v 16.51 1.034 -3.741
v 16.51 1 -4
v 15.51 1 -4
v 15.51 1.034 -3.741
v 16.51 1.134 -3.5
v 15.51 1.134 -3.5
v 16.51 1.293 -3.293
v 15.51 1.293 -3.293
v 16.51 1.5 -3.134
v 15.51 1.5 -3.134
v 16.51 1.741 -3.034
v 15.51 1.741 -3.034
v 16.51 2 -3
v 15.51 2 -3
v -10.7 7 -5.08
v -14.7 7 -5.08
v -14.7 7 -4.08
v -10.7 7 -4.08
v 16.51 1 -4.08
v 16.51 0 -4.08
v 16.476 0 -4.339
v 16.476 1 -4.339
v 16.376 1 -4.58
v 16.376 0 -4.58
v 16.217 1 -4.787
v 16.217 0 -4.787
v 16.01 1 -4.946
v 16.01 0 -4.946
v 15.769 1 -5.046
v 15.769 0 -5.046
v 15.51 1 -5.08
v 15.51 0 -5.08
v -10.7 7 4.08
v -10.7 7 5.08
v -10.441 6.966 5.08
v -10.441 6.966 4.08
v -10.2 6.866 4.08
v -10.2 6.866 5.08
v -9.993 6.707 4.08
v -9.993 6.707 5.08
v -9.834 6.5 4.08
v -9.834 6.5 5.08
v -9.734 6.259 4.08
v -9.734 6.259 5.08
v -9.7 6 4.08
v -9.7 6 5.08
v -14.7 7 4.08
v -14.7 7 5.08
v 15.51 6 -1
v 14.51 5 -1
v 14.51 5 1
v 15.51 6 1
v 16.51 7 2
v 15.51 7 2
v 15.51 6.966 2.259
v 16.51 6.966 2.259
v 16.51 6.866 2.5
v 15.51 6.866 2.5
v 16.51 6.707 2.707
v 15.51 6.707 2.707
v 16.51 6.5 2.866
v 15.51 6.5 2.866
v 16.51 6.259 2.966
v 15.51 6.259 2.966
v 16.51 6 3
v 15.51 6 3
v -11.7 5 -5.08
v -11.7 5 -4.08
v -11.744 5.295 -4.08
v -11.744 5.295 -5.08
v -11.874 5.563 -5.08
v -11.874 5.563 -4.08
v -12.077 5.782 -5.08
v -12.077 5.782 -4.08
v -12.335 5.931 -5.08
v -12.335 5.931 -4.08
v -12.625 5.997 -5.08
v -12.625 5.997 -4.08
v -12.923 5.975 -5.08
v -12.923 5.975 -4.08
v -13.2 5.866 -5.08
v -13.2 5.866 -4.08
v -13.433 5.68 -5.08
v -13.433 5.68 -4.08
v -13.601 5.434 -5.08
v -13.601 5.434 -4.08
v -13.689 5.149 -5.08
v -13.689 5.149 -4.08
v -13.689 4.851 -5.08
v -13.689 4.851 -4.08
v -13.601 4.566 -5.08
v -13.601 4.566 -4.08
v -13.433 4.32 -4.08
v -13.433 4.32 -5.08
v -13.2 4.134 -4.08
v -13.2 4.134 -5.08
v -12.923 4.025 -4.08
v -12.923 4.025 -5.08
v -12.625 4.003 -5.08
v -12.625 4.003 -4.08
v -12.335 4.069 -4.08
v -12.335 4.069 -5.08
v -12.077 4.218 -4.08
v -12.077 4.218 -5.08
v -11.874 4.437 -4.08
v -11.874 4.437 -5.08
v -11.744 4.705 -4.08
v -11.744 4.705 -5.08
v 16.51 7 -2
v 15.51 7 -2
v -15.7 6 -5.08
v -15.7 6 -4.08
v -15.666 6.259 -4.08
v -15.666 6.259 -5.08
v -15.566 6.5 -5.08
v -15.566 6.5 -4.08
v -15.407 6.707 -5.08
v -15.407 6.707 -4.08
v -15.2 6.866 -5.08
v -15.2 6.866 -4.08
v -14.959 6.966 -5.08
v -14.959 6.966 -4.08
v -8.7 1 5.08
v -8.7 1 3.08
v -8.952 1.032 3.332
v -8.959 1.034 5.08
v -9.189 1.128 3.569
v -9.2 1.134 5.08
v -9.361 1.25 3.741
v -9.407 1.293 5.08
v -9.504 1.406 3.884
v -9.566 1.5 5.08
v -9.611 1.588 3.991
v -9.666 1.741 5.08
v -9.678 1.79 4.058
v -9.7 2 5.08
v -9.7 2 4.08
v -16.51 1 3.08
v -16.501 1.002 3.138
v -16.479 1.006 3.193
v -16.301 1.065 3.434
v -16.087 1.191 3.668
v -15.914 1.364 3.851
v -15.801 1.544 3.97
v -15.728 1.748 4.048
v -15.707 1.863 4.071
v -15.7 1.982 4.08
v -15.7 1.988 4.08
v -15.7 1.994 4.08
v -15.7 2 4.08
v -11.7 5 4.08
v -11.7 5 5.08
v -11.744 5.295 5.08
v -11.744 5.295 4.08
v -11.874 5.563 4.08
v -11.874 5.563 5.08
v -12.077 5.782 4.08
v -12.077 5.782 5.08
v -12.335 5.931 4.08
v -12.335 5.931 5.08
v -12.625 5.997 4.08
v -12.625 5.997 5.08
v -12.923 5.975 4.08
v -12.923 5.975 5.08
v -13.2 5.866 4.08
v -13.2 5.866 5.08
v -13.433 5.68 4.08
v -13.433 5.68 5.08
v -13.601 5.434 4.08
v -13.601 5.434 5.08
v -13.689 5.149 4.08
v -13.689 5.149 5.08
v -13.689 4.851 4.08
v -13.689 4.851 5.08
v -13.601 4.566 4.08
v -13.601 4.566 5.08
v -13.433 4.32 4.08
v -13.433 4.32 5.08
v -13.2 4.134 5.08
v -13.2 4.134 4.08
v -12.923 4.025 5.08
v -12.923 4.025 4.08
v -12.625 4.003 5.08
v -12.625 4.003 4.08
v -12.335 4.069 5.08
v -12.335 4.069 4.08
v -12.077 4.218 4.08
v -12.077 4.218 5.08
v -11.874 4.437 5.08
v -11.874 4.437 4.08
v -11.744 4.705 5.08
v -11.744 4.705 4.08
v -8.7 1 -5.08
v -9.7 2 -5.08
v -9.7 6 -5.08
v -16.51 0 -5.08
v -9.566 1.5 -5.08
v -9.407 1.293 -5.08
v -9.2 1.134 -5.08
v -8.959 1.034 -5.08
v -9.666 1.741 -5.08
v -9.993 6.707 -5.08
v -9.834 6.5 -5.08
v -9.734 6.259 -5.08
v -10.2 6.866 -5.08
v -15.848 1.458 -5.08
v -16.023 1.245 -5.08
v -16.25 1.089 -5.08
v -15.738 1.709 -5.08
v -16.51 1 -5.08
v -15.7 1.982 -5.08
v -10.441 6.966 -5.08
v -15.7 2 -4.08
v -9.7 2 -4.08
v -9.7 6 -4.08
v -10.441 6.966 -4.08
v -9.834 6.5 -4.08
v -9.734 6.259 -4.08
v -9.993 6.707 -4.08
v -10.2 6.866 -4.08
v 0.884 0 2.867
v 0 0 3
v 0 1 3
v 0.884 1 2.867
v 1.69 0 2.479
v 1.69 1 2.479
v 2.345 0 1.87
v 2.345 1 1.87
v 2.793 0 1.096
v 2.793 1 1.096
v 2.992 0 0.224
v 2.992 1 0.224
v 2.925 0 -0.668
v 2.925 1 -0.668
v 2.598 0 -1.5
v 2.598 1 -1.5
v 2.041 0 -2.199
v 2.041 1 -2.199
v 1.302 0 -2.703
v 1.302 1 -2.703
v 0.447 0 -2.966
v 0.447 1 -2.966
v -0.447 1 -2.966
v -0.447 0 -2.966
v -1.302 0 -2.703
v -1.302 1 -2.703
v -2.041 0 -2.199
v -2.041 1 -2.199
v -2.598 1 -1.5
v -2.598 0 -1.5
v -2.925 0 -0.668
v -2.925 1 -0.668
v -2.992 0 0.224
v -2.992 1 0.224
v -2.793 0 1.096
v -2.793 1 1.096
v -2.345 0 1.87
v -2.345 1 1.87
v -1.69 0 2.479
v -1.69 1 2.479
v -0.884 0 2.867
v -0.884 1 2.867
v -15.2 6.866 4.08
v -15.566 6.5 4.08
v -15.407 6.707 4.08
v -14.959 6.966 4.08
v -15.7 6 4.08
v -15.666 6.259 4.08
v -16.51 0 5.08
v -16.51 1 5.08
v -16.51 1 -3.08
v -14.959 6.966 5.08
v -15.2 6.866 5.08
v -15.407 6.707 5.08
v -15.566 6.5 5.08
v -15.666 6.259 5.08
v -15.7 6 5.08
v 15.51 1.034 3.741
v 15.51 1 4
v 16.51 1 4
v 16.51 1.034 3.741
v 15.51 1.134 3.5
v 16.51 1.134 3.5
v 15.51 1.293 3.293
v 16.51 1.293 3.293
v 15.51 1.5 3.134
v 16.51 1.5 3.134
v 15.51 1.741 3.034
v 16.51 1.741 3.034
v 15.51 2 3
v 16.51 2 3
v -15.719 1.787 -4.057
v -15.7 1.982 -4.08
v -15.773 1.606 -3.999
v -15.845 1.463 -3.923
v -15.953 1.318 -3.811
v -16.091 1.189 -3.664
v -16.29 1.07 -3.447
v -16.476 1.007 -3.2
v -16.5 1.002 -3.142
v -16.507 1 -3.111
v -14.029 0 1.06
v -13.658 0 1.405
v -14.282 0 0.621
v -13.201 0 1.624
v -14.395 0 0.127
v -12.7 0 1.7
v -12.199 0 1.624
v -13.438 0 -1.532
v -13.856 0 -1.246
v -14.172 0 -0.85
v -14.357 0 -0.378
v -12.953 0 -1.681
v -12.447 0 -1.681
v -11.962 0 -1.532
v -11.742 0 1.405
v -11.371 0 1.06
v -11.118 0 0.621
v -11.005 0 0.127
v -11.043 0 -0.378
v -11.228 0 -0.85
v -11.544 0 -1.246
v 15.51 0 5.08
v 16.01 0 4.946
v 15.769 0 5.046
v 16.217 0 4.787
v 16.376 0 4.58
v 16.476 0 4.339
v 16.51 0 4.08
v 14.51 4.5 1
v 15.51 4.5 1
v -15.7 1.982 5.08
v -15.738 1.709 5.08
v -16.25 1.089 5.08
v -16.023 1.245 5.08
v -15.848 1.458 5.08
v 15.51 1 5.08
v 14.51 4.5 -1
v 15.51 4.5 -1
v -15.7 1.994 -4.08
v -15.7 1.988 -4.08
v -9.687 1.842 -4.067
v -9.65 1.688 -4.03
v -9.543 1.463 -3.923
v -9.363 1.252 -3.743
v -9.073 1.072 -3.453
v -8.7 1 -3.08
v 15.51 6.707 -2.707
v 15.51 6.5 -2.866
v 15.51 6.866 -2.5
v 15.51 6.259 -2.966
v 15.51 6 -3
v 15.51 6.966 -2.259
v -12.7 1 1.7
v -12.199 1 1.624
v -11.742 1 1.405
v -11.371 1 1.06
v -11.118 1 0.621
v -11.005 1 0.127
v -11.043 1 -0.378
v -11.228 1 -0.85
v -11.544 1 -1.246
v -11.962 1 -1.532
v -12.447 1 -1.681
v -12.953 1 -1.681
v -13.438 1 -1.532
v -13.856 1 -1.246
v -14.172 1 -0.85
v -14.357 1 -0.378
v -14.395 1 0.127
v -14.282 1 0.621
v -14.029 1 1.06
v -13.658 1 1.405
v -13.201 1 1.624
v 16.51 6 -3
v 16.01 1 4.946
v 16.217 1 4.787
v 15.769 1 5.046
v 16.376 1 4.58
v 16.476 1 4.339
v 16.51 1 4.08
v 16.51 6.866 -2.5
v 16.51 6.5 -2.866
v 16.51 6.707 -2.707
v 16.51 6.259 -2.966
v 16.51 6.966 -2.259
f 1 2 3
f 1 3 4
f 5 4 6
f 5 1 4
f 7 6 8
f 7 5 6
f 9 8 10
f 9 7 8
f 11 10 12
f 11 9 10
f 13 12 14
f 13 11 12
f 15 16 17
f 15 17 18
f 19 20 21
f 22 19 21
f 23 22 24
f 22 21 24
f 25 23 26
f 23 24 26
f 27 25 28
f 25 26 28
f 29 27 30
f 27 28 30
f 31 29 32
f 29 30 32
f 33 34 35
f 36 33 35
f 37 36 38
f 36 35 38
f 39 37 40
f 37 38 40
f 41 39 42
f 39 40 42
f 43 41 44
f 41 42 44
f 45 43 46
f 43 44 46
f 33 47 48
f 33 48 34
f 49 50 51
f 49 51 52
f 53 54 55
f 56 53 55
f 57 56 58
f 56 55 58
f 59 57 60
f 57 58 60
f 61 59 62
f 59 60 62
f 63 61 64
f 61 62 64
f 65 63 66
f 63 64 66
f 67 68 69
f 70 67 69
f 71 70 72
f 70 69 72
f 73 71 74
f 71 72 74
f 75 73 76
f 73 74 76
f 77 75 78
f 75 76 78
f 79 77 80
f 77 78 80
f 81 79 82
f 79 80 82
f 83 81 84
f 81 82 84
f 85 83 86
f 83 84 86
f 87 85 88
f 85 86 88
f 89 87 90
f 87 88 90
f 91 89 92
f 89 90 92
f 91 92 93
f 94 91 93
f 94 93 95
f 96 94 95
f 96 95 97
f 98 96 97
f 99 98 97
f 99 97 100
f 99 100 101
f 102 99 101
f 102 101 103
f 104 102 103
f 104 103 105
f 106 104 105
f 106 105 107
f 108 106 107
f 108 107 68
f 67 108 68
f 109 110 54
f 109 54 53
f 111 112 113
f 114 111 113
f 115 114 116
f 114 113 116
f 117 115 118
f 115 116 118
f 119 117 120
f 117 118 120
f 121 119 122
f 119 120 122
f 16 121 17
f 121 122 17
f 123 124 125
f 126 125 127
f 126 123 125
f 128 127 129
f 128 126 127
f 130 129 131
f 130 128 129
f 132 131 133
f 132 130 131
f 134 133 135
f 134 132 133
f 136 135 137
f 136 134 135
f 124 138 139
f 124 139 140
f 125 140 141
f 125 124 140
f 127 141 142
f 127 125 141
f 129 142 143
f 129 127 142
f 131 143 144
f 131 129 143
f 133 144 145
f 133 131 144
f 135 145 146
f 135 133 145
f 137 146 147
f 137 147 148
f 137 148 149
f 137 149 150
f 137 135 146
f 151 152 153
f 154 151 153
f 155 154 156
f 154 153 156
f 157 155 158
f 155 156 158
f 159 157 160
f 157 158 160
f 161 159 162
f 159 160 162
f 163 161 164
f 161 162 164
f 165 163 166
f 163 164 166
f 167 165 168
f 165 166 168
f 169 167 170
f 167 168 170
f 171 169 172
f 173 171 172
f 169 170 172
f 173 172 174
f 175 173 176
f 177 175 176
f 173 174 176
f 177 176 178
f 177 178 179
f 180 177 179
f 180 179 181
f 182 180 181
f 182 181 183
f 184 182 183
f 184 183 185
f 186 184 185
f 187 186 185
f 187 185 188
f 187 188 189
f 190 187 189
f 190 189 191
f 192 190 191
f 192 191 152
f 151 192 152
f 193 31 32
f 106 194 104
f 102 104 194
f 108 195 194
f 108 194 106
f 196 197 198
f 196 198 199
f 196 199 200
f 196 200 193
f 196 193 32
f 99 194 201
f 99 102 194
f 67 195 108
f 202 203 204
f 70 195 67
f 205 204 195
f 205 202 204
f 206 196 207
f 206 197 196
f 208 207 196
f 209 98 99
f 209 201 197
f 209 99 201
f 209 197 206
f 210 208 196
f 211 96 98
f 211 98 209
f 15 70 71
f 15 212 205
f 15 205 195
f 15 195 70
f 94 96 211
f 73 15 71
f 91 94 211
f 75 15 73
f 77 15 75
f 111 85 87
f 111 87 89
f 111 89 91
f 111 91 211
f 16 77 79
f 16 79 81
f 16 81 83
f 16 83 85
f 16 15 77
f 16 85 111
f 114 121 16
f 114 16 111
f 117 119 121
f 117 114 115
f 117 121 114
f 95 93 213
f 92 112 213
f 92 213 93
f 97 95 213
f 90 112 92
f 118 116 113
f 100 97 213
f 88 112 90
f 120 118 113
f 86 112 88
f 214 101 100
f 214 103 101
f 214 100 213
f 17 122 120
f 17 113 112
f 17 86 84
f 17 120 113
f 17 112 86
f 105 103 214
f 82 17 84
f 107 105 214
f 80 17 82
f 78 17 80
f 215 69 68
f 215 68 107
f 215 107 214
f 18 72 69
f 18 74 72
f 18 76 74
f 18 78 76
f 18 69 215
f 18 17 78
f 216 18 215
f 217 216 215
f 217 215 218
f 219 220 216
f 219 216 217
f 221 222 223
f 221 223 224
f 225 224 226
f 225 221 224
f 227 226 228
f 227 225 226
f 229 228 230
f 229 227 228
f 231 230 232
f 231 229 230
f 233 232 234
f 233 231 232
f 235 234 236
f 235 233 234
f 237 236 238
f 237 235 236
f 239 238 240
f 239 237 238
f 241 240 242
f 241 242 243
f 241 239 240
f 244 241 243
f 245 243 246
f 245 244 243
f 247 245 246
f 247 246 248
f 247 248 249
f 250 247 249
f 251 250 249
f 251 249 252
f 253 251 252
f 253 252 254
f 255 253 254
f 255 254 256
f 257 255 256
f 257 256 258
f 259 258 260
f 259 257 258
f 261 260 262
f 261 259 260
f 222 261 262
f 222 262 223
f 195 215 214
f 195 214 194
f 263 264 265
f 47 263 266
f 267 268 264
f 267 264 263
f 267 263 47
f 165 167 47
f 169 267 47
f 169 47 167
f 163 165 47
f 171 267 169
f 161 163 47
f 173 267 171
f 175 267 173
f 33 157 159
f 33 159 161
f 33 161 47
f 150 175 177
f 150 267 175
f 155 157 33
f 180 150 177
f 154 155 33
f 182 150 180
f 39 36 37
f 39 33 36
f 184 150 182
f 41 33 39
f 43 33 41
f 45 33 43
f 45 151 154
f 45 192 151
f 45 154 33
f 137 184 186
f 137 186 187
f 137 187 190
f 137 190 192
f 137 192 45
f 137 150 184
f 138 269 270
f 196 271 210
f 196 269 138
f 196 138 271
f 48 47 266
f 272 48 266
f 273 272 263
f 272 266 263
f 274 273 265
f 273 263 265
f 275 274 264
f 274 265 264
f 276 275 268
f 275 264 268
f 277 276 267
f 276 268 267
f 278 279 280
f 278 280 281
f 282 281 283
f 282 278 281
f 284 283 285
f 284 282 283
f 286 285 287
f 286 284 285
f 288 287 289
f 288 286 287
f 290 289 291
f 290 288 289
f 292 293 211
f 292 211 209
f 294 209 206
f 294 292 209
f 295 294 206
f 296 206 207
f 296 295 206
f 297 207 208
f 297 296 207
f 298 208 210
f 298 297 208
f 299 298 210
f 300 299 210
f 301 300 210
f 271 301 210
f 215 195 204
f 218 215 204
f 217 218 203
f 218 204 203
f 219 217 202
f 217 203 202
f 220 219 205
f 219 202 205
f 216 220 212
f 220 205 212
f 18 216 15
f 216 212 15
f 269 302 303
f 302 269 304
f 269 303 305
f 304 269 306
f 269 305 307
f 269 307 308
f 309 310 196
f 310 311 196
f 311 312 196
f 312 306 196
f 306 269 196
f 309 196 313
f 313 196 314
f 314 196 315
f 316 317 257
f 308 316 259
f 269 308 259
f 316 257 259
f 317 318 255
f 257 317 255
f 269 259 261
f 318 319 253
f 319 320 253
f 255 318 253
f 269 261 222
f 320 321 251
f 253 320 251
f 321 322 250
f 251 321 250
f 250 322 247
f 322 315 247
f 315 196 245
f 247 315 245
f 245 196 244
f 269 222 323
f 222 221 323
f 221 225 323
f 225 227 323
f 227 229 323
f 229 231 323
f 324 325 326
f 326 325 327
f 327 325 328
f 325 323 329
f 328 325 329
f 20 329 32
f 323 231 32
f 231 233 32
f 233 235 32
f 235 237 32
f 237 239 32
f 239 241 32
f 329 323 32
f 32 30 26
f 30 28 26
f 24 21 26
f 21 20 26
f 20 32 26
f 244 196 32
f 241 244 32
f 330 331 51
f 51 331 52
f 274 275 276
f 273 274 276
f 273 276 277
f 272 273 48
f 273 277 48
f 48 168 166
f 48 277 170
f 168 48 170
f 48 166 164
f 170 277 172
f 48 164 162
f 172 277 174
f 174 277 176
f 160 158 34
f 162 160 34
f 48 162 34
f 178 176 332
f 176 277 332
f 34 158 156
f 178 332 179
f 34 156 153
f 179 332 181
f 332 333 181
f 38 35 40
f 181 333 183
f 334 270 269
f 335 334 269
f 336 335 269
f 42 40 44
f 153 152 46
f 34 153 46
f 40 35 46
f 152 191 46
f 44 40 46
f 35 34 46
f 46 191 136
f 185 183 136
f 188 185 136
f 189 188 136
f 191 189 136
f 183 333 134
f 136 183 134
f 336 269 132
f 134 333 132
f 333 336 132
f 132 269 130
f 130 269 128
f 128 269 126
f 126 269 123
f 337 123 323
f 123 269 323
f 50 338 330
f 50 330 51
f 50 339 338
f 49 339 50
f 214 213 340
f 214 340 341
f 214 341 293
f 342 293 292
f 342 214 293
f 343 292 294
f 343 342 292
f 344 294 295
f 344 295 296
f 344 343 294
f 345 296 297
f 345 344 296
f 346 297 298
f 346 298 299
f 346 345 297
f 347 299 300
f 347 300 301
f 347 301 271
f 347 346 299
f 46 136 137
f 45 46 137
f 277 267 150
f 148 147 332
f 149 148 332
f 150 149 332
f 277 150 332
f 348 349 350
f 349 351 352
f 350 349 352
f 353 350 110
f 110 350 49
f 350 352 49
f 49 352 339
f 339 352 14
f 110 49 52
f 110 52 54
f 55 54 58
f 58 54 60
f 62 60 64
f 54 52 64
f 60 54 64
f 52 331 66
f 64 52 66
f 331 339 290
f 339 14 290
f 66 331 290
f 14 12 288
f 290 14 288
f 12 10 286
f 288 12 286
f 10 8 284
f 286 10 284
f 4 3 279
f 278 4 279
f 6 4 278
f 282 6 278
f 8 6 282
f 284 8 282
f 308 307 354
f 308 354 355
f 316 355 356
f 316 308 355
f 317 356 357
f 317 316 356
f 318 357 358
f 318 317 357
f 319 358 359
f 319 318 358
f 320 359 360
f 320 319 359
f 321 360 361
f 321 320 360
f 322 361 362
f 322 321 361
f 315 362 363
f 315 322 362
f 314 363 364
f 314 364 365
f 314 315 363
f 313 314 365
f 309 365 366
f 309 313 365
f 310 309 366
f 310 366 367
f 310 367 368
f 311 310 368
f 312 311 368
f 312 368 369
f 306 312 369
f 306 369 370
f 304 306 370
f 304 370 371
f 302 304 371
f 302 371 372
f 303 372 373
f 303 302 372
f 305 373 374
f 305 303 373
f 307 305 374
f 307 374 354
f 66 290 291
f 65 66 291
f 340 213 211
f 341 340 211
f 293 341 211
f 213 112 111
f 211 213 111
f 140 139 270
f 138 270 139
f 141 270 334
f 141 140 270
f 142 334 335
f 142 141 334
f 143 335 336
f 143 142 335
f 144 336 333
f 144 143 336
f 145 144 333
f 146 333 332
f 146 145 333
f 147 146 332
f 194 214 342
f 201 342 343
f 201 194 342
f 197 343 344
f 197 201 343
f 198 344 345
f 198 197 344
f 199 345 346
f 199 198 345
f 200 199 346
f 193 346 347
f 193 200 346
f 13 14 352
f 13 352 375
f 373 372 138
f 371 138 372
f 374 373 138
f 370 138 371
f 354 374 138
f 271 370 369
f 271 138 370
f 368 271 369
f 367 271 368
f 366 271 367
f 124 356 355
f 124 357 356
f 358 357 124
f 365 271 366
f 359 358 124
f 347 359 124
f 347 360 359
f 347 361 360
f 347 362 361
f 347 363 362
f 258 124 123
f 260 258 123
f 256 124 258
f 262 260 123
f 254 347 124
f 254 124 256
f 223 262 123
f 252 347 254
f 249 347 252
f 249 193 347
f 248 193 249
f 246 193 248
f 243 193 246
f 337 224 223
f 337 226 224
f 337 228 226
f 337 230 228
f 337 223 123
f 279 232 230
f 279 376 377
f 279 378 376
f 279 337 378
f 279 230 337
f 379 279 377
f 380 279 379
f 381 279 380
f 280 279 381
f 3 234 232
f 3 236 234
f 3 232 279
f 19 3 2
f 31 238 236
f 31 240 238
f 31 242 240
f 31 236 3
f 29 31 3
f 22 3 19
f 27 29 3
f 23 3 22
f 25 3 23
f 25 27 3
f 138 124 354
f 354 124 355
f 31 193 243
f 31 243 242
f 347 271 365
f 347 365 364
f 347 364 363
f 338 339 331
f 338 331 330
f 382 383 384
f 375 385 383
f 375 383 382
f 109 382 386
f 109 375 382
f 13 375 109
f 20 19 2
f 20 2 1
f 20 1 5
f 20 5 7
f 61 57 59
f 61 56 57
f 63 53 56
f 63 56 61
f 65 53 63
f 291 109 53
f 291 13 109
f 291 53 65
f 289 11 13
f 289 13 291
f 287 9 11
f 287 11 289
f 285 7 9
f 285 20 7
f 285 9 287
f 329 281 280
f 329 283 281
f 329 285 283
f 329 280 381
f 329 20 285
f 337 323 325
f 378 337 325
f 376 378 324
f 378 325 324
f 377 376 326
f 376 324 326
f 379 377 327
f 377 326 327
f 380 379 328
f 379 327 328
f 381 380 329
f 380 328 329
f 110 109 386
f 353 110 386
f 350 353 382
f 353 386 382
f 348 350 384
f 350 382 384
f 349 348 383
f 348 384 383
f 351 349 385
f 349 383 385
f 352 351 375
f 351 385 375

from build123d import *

# Parameters (mm, degrees)
SKETCH1_W                = 33.02
SKETCH1_H                = 10.16
SKETCH1_R                = 3
SKETCH1_R_2              = 1.7
BOSS_EXTRUDE1_DEPTH      = 1
SKETCH2_W                = 6
SKETCH2_H                = 1
SKETCH2_W_2              = 1
SKETCH2_H_2              = 6
BOSS_EXTRUDE2_DEPTH      = 6
SKETCH3_R                = 1
CUT_EXTRUDE1_DEPTH       = 21.610815122
FILLET1_R                = 1
BOSS_EXTRUDE3_DEPTH      = 1
BOSS_EXTRUDE3_DEPTH_BACK = 1


with BuildPart() as part:
    # Sketch1 → Boss-Extrude1 (new body)
    with BuildSketch(Plane(origin=(0, 0, 0), x_dir=(1, 0, 0), z_dir=(0, 1, 0))):
        Rectangle(SKETCH1_W, SKETCH1_H)
        with Locations(Location((0, 0, 0), (0, 0, 270))):
            Circle(SKETCH1_R, mode=Mode.SUBTRACT)
        with Locations(Location((-12.7, 0, 0), (0, 0, 270))):
            Circle(SKETCH1_R_2, mode=Mode.SUBTRACT)
    extrude(amount=BOSS_EXTRUDE1_DEPTH)

    # Sketch2 → Boss-Extrude2 (add)
    with BuildSketch(Plane(origin=(0, 1, 0), x_dir=(1, 0, 0), z_dir=(0, 1, 0))):
        with Locations((-12.7, 4.58)):
            Rectangle(SKETCH2_W, SKETCH2_H)
        with Locations((-12.7, -4.58)):
            Rectangle(SKETCH2_W, SKETCH2_H)
        with Locations((16.01, 0)):
            Rectangle(SKETCH2_W_2, SKETCH2_H_2)
    extrude(amount=BOSS_EXTRUDE2_DEPTH)

    # Sketch3 → Cut-Extrude1 (cut, through all)
    with BuildSketch(Plane.XY.offset(5.08)):
        with Locations((-12.7, 5)):
            Circle(SKETCH3_R)
    extrude(amount=-CUT_EXTRUDE1_DEPTH, mode=Mode.SUBTRACT)

    # Fillet1
    # the kernel refuses this fillet: 1 mm, written as the material it adds along each edge
    with BuildSketch(Plane(origin=(-15.7, 1, -4.08), x_dir=(-1, 0, 0), z_dir=(0, 0, -1))) as fillet1_piece_1:
        with BuildLine():
            CenterArc((1, 0.98178409), FILLET1_R, 180, 79.047215801)
            Line((0, 0.98178409), (0, 0))
            Line((0, 0), (0.81, 0))
        make_face()
    extrude(amount=1)
    with BuildSketch(Plane(origin=(-9.7, 1, -4.08), x_dir=(0, 0, 1), z_dir=(-1, 0, 0))) as fillet1_piece_2:
        with BuildLine():
            CenterArc((FILLET1_R, FILLET1_R), FILLET1_R, 180, 90)
            Line((0, FILLET1_R), (0, 0))
            Line((0, 0), (FILLET1_R, 0))
        make_face()
    extrude(amount=6)
    with BuildSketch(Plane(origin=(-9.7, 1, -5.08), x_dir=(1, 0, 0), z_dir=(0, 0, 1))) as fillet1_piece_3:
        with BuildLine():
            CenterArc((FILLET1_R, FILLET1_R), FILLET1_R, 180, 90)
            Line((0, FILLET1_R), (0, 0))
            Line((0, 0), (FILLET1_R, 0))
        make_face()
    extrude(amount=1)
    with BuildSketch(Plane(origin=(16.51, 1, -3), x_dir=(0, 0, -1), z_dir=(-1, 0, 0)), Plane(origin=(15.51, 1, 3), x_dir=(0, 0, 1), z_dir=(1, 0, 0)), Plane(origin=(-9.7, 1, 5.08), x_dir=(1, 0, 0), z_dir=(0, 0, -1))) as fillet1_piece_4:
        with BuildLine():
            CenterArc((FILLET1_R, -FILLET1_R), FILLET1_R, 90, 90)
            Line((0, -FILLET1_R), (0, 0))
            Line((0, 0), (FILLET1_R, 0))
        make_face()
    extrude(amount=1)
    with BuildSketch(Plane(origin=(-15.7, 1, 4.08), x_dir=(-1, 0, 0), z_dir=(0, 0, 1))) as fillet1_piece_5:
        with BuildLine():
            CenterArc((1, -0.98178409), FILLET1_R, 100.952784199, 79.047215801)
            Line((0, -0.98178409), (0, 0))
            Line((0, 0), (0.81, 0))
        make_face()
    extrude(amount=1)
    with BuildSketch(Plane(origin=(-9.7, 1, 4.08), x_dir=(0, 0, -1), z_dir=(-1, 0, 0))) as fillet1_piece_6:
        with BuildLine():
            CenterArc((FILLET1_R, -FILLET1_R), FILLET1_R, 90, 90)
            Line((0, -FILLET1_R), (0, 0))
            Line((0, 0), (FILLET1_R, 0))
        make_face()
    extrude(amount=6)
    with BuildSketch(Plane(origin=(-15.7, 1, -1.625539774), x_dir=(-1, 0, 0), z_dir=(0, 0, -1))) as fillet1_piece_7a_section:
        with BuildLine():
            CenterArc((1, 0.98178409), FILLET1_R, 180, 79.047215801)
            Line((0, 0.98178409), (0, 0))
            Line((0, 0), (0.81, 0))
        make_face()
    fillet1_piece_7a = extrude(amount=3.454460226, mode=Mode.PRIVATE)
    fillet1_piece_7a = split(fillet1_piece_7a, bisect_by=Plane(origin=(-15.7, 1, -4.08), z_dir=(0, 0, 1)), keep=Keep.TOP, mode=Mode.PRIVATE)
    with BuildSketch(Plane(origin=(-9.7, 1, -4.08), x_dir=(0, 0, 1), z_dir=(-1, 0, 0))) as fillet1_piece_7b_section:
        with BuildLine():
            CenterArc((FILLET1_R, FILLET1_R), FILLET1_R, 180, 90)
            Line((0, FILLET1_R), (0, 0))
            Line((0, 0), (FILLET1_R, 0))
        make_face()
    fillet1_piece_7b = extrude(amount=8.5, mode=Mode.PRIVATE)
    fillet1_piece_7b = split(fillet1_piece_7b, bisect_by=Plane(origin=(-16.51, 1, -4.08), z_dir=(1, 0, 0)), keep=Keep.TOP, mode=Mode.PRIVATE)
    fillet1_piece_7b = split(fillet1_piece_7b, bisect_by=Plane(origin=(-15.7, 1, -4.08), z_dir=(-1, 0, 0)), keep=Keep.TOP, mode=Mode.PRIVATE)
    fillet1_piece_7 = fillet1_piece_7a & fillet1_piece_7b
    add(fillet1_piece_7)
    with BuildSketch(Plane(origin=(-7.2, 1, -4.08), x_dir=(0, 0, 1), z_dir=(-1, 0, 0))) as fillet1_piece_8a_section:
        with BuildLine():
            CenterArc((FILLET1_R, FILLET1_R), FILLET1_R, 180, 90)
            Line((0, FILLET1_R), (0, 0))
            Line((0, 0), (FILLET1_R, 0))
        make_face()
    fillet1_piece_8a = extrude(amount=8.5, mode=Mode.PRIVATE)
    fillet1_piece_8a = split(fillet1_piece_8a, bisect_by=Plane(origin=(-9.7, 1, -4.08), z_dir=(1, 0, 0)), keep=Keep.TOP, mode=Mode.PRIVATE)
    with BuildSketch(Plane(origin=(-9.7, 1, -5.08), x_dir=(1, 0, 0), z_dir=(0, 0, 1))) as fillet1_piece_8b_section:
        with BuildLine():
            CenterArc((FILLET1_R, FILLET1_R), FILLET1_R, 180, 90)
            Line((0, FILLET1_R), (0, 0))
            Line((0, 0), (FILLET1_R, 0))
        make_face()
    fillet1_piece_8b = extrude(amount=3.5, mode=Mode.PRIVATE)
    fillet1_piece_8b = split(fillet1_piece_8b, bisect_by=Plane(origin=(-9.7, 1, -4.08), z_dir=(0, 0, 1)), keep=Keep.TOP, mode=Mode.PRIVATE)
    fillet1_piece_8 = fillet1_piece_8a & fillet1_piece_8b
    add(fillet1_piece_8)
    with BuildSketch(Plane(origin=(-9.7, 1, 4.08), x_dir=(0, 0, -1), z_dir=(-1, 0, 0))) as fillet1_piece_9a_section:
        with BuildLine():
            CenterArc((FILLET1_R, -FILLET1_R), FILLET1_R, 90, 90)
            Line((0, -FILLET1_R), (0, 0))
            Line((0, 0), (FILLET1_R, 0))
        make_face()
    fillet1_piece_9a = extrude(amount=8.5, mode=Mode.PRIVATE)
    fillet1_piece_9a = split(fillet1_piece_9a, bisect_by=Plane(origin=(-16.51, 1, 4.08), z_dir=(1, 0, 0)), keep=Keep.TOP, mode=Mode.PRIVATE)
    fillet1_piece_9a = split(fillet1_piece_9a, bisect_by=Plane(origin=(-15.7, 1, 4.08), z_dir=(-1, 0, 0)), keep=Keep.TOP, mode=Mode.PRIVATE)
    with BuildSketch(Plane(origin=(-15.7, 1, 1.625539774), x_dir=(-1, 0, 0), z_dir=(0, 0, 1))) as fillet1_piece_9b_section:
        with BuildLine():
            CenterArc((1, -0.98178409), FILLET1_R, 100.952784199, 79.047215801)
            Line((0, -0.98178409), (0, 0))
            Line((0, 0), (0.81, 0))
        make_face()
    fillet1_piece_9b = extrude(amount=3.454460226, mode=Mode.PRIVATE)
    fillet1_piece_9b = split(fillet1_piece_9b, bisect_by=Plane(origin=(-15.7, 1, 4.08), z_dir=(0, 0, -1)), keep=Keep.TOP, mode=Mode.PRIVATE)
    fillet1_piece_9 = fillet1_piece_9a & fillet1_piece_9b
    add(fillet1_piece_9)
    with BuildSketch(Plane(origin=(-9.7, 1, 5.08), x_dir=(1, 0, 0), z_dir=(0, 0, -1))) as fillet1_piece_10a_section:
        with BuildLine():
            CenterArc((FILLET1_R, -FILLET1_R), FILLET1_R, 90, 90)
            Line((0, -FILLET1_R), (0, 0))
            Line((0, 0), (FILLET1_R, 0))
        make_face()
    fillet1_piece_10a = extrude(amount=3.5, mode=Mode.PRIVATE)
    fillet1_piece_10a = split(fillet1_piece_10a, bisect_by=Plane(origin=(-9.7, 1, 4.08), z_dir=(0, 0, -1)), keep=Keep.TOP, mode=Mode.PRIVATE)
    with BuildSketch(Plane(origin=(-7.2, 1, 4.08), x_dir=(0, 0, -1), z_dir=(-1, 0, 0))) as fillet1_piece_10b_section:
        with BuildLine():
            CenterArc((FILLET1_R, -FILLET1_R), FILLET1_R, 90, 90)
            Line((0, -FILLET1_R), (0, 0))
            Line((0, 0), (FILLET1_R, 0))
        make_face()
    fillet1_piece_10b = extrude(amount=8.5, mode=Mode.PRIVATE)
    fillet1_piece_10b = split(fillet1_piece_10b, bisect_by=Plane(origin=(-9.7, 1, 4.08), z_dir=(1, 0, 0)), keep=Keep.TOP, mode=Mode.PRIVATE)
    fillet1_piece_10 = fillet1_piece_10a & fillet1_piece_10b
    add(fillet1_piece_10)
    # the kernel refuses this fillet: 1 mm, written as the material it takes off along each edge
    with BuildSketch(Plane(origin=(-15.7, 7, -1.58), x_dir=(0, -1, 0), z_dir=(0, 0, -1)), Plane(origin=(13.01, 7, 3), x_dir=(0, 0, -1), z_dir=(1, 0, 0)), Plane(origin=(-15.7, 7, 1.58), x_dir=(1, 0, 0), z_dir=(0, 0, 1)), Plane(origin=(16.51, -2.5, 5.08), x_dir=(-1, 0, 0), z_dir=(0, 1, 0))) as fillet1_2_piece_1:
        with BuildLine():
            CenterArc((FILLET1_R, -FILLET1_R), FILLET1_R, 90, 90)
            Line((0, -FILLET1_R), (0, 0))
            Line((0, 0), (FILLET1_R, 0))
        make_face()
    extrude(amount=6, mode=Mode.SUBTRACT)
    with BuildSketch(Plane(origin=(-9.7, 7, -7.58), x_dir=(-1, 0, 0), z_dir=(0, 0, 1)), Plane(origin=(19.01, 7, -3), x_dir=(0, -1, 0), z_dir=(-1, 0, 0)), Plane(origin=(-9.7, 7, 7.58), x_dir=(0, -1, 0), z_dir=(0, 0, -1)), Plane(origin=(16.51, -2.5, -5.08), x_dir=(-1, 0, 0), z_dir=(0, 1, 0))) as fillet1_2_piece_2:
        with BuildLine():
            CenterArc((FILLET1_R, FILLET1_R), FILLET1_R, 180, 90)
            Line((0, FILLET1_R), (0, 0))
            Line((0, 0), (FILLET1_R, 0))
        make_face()
    extrude(amount=6, mode=Mode.SUBTRACT)

    # Sketch4 → Boss-Extrude3 (add, two sides: drawn at the far end of the back side and taken through both)
    with BuildSketch(Plane.XY.offset(-BOSS_EXTRUDE3_DEPTH_BACK)):
        Polygon((14.51, 5), (15.51, 6), (15.51, 4.5), (14.51, 4.5), align=None)
    extrude(amount=BOSS_EXTRUDE3_DEPTH + BOSS_EXTRUDE3_DEPTH_BACK)


solid = part.part
